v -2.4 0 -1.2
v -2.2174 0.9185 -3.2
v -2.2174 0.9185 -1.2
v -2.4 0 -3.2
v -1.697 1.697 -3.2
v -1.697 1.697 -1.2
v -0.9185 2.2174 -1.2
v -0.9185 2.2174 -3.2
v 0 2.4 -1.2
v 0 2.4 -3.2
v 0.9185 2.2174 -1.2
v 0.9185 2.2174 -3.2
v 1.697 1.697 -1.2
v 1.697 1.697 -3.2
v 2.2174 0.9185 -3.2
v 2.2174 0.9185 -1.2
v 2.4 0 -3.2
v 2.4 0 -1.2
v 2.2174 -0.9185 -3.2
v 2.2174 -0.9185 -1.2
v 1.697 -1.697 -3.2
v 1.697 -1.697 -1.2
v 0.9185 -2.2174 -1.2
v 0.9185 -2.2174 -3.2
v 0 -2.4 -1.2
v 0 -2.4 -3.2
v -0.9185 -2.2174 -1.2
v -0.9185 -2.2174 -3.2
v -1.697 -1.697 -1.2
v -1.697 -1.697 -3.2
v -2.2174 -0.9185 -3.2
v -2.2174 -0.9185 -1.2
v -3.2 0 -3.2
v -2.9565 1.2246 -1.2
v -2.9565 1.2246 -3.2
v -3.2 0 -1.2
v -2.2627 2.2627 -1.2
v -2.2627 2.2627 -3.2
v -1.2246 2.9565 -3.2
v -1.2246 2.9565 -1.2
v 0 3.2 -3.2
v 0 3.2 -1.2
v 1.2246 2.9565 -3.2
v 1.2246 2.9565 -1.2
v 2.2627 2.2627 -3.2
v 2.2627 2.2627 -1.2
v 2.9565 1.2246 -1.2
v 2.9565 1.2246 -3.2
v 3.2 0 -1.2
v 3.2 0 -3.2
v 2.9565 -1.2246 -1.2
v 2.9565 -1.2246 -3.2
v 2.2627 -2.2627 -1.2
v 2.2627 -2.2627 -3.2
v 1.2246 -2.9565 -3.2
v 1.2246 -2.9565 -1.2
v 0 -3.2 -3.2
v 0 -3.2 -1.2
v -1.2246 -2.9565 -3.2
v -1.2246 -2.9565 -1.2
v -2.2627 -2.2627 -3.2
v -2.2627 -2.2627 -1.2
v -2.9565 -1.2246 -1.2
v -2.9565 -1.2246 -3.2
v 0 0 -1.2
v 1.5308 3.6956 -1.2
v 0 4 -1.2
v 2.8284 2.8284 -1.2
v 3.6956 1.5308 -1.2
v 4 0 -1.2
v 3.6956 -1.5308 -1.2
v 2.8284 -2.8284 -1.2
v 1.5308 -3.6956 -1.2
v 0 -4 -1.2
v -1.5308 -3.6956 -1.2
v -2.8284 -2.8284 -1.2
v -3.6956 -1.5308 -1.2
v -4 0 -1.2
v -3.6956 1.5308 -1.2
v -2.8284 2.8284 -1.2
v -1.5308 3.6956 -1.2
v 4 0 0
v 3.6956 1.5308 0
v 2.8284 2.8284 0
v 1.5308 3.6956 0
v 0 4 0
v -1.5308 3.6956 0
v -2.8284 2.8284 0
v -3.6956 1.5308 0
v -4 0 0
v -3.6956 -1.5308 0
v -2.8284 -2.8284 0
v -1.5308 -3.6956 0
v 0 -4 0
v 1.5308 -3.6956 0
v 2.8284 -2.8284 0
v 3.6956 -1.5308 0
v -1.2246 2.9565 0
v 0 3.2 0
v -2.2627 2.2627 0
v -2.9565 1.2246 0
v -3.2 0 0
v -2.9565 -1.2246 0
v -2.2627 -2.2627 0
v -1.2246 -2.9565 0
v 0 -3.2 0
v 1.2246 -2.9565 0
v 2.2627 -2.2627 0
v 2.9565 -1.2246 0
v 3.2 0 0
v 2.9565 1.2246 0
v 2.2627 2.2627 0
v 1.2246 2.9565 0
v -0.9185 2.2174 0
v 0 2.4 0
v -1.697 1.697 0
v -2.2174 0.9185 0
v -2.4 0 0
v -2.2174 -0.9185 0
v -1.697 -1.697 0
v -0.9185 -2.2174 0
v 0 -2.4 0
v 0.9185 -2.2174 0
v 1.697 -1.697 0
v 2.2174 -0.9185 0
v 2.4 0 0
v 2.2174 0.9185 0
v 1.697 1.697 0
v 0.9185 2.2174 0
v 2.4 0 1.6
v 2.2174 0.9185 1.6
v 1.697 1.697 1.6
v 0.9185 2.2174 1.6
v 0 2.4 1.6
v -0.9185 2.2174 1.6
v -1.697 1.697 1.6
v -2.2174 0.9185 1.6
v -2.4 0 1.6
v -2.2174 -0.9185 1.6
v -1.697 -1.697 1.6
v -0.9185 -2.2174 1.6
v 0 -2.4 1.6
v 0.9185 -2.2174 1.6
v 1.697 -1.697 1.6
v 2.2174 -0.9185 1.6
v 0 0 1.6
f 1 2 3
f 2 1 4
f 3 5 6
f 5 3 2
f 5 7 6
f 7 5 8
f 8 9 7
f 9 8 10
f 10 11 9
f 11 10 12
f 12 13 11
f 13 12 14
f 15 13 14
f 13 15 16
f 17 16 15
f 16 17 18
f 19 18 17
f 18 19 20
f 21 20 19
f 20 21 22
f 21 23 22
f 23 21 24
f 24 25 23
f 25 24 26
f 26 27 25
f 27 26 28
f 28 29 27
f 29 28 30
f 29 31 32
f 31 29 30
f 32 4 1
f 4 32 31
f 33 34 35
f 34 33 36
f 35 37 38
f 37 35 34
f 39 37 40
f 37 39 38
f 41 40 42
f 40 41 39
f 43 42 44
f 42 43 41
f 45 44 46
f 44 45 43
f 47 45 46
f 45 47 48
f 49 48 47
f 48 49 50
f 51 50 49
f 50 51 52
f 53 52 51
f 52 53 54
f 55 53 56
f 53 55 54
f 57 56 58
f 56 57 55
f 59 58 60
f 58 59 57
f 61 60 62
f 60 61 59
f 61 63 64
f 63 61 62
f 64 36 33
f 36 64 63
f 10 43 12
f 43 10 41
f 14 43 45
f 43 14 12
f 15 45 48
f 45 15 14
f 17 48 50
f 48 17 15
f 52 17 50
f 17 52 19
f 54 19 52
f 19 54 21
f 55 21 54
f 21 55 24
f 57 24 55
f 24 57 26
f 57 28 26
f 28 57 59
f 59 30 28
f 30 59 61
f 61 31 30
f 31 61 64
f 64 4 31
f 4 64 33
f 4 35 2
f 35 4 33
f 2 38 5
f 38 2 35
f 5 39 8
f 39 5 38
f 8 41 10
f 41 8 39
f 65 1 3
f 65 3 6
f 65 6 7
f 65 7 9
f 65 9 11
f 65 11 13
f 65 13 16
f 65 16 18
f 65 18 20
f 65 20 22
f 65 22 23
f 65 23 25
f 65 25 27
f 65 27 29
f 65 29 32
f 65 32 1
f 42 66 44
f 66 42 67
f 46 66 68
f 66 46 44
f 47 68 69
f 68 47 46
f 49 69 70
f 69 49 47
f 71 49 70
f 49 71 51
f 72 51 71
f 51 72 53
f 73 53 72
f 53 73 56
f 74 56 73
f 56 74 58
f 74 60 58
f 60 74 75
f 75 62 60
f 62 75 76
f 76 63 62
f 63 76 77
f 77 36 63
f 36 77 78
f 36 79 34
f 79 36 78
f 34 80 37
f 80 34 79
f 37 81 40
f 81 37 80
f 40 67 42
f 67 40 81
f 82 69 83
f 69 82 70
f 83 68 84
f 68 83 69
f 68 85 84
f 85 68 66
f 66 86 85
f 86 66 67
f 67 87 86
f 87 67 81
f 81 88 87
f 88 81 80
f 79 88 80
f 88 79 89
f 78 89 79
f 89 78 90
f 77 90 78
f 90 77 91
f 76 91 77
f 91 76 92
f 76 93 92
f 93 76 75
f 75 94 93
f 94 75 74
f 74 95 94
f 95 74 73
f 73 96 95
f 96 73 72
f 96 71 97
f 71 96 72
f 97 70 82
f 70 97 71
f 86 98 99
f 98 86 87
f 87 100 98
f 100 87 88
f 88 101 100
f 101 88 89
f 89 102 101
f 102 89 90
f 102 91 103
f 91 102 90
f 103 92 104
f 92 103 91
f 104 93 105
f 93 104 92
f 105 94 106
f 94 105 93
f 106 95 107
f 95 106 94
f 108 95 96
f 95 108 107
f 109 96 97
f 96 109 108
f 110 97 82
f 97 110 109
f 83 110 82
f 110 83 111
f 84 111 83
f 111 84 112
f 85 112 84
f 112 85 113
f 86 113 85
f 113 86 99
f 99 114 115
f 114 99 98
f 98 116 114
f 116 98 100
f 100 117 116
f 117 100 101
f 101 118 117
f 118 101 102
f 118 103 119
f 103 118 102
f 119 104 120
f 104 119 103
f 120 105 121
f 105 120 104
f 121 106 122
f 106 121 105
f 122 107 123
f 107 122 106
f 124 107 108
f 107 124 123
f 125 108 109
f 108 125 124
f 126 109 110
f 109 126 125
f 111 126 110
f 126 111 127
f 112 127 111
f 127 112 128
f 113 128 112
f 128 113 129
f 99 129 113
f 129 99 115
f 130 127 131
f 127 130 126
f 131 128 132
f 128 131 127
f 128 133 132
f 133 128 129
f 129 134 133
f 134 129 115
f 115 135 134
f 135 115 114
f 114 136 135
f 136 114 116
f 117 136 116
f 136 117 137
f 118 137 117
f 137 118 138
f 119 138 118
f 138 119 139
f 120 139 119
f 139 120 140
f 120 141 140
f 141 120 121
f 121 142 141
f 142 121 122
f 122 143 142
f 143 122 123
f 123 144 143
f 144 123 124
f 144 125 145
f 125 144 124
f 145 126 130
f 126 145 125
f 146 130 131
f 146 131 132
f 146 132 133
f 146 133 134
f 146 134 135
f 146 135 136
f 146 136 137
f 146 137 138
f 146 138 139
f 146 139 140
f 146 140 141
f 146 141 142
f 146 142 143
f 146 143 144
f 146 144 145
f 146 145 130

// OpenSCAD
// file: ../p/4-4edge.scad
use <../lib.scad>
function ldraw_lib__4_4edge() = [
// 0 Circle 1.0
// 0 Name: 4-4edge.dat
// 0 Author: James Jessiman
// 0 !LDRAW_ORG Primitive UPDATE 2017-01
// 0 !LICENSE Licensed under CC BY 2.0 and CC BY 4.0 : see CAreadme.txt
// 
// 0 BFC CERTIFY CCW
  [0,"BFC","CERTIFY"],
  [0,"BFC","CCW"],
// 
// 0 !HISTORY 1998-12-15 [PTadmin] Official Update 1998-10
// 0 !HISTORY 2005-12-28 [PTadmin] Official Update 2005-01
// 0 !HISTORY 2007-06-24 [PTadmin] Header formatted for Contributor Agreement
// 0 !HISTORY 2008-07-01 [PTadmin] Official Update 2008-01
// 0 !HISTORY 2017-01-15 [Steffen] BFCed
// 0 !HISTORY 2017-12-30 [PTadmin] Official Update 2017-01
// 
// 
// 2 24 1 0 0 0.9239 0 0.3827
  [2,24,1,0,0,0.9239,0,0.3827],
// 2 24 0.9239 0 0.3827 0.7071 0 0.7071
  [2,24,0.9239,0,0.3827,0.7071,0,0.7071],
// 2 24 0.7071 0 0.7071 0.3827 0 0.9239
  [2,24,0.7071,0,0.7071,0.3827,0,0.9239],
// 2 24 0.3827 0 0.9239 0 0 1
  [2,24,0.3827,0,0.9239,0,0,1],
// 2 24 0 0 1 -0.3827 0 0.9239
  [2,24,0,0,1,-0.3827,0,0.9239],
// 2 24 -0.3827 0 0.9239 -0.7071 0 0.7071
  [2,24,-0.3827,0,0.9239,-0.7071,0,0.7071],
// 2 24 -0.7071 0 0.7071 -0.9239 0 0.3827
  [2,24,-0.7071,0,0.7071,-0.9239,0,0.3827],
// 2 24 -0.9239 0 0.3827 -1 0 -0
  [2,24,-0.9239,0,0.3827,-1,0,-0],
// 2 24 -1 0 -0 -0.9239 0 -0.3827
  [2,24,-1,0,-0,-0.9239,0,-0.3827],
// 2 24 -0.9239 0 -0.3827 -0.7071 0 -0.7071
  [2,24,-0.9239,0,-0.3827,-0.7071,0,-0.7071],
// 2 24 -0.7071 0 -0.7071 -0.3827 0 -0.9239
  [2,24,-0.7071,0,-0.7071,-0.3827,0,-0.9239],
// 2 24 -0.3827 0 -0.9239 0 0 -1
  [2,24,-0.3827,0,-0.9239,0,0,-1],
// 2 24 0 0 -1 0.3827 0 -0.9239
  [2,24,0,0,-1,0.3827,0,-0.9239],
// 2 24 0.3827 0 -0.9239 0.7071 0 -0.7071
  [2,24,0.3827,0,-0.9239,0.7071,0,-0.7071],
// 2 24 0.7071 0 -0.7071 0.9239 0 -0.3827
  [2,24,0.7071,0,-0.7071,0.9239,0,-0.3827],
// 2 24 0.9239 0 -0.3827 1 0 0
  [2,24,0.9239,0,-0.3827,1,0,0],
];
makepoly(ldraw_lib__4_4edge(), line=0.2);
// file: ../p/4-4cyli.scad
use <../lib.scad>
function ldraw_lib__4_4cyli() = [
// 0 Cylinder 1.0
// 0 Name: 4-4cyli.dat
// 0 Author: James Jessiman
// 0 !LDRAW_ORG Primitive UPDATE 2005-01
// 0 !LICENSE Licensed under CC BY 2.0 and CC BY 4.0 : see CAreadme.txt
// 
// 0 BFC CERTIFY CCW
  [0,"BFC","CERTIFY"],
  [0,"BFC","CCW"],
// 
// 0 !HISTORY 1998-12-15 [PTadmin] Official Update 1998-10
// 0 !HISTORY 2002-03-23 [sbliss] Added BFC statement; merged headers from files in distributions LDraw 0.27 and Complete.
// 0 !HISTORY 2002-04-25 [PTadmin] Official Update 2002-02
// 0 !HISTORY 2004-12-14 [guyvivan] BFC CCW
// 0 !HISTORY 2005-12-28 [PTadmin] Official Update 2005-01
// 0 !HISTORY 2007-06-24 [PTadmin] Header formatted for Contributor Agreement
// 0 !HISTORY 2008-07-01 [PTadmin] Official Update 2008-01
// 
// 
// 4 16 1 1 0 0.9239 1 0.3827 0.9239 0 0.3827 1 0 0
  [4,16,1,1,0,0.9239,1,0.3827,0.9239,0,0.3827,1,0,0],
// 5 24 1 0 0 1 1 0 0.9239 0 0.3827 0.9239 0 -0.3827
  [5,24,1,0,0,1,1,0,0.9239,0,0.3827,0.9239,0,-0.3827],
// 4 16 0.9239 1 0.3827 0.7071 1 0.7071 0.7071 0 0.7071 0.9239 0 0.3827
  [4,16,0.9239,1,0.3827,0.7071,1,0.7071,0.7071,0,0.7071,0.9239,0,0.3827],
// 5 24 0.9239 0 0.3827 0.9239 1 0.3827 0.7071 0 0.7071 1 0 0
  [5,24,0.9239,0,0.3827,0.9239,1,0.3827,0.7071,0,0.7071,1,0,0],
// 4 16 0.7071 1 0.7071 0.3827 1 0.9239 0.3827 0 0.9239 0.7071 0 0.7071
  [4,16,0.7071,1,0.7071,0.3827,1,0.9239,0.3827,0,0.9239,0.7071,0,0.7071],
// 5 24 0.7071 0 0.7071 0.7071 1 0.7071 0.3827 0 0.9239 0.9239 0 0.3827
  [5,24,0.7071,0,0.7071,0.7071,1,0.7071,0.3827,0,0.9239,0.9239,0,0.3827],
// 4 16 0.3827 1 0.9239 0 1 1 0 0 1 0.3827 0 0.9239
  [4,16,0.3827,1,0.9239,0,1,1,0,0,1,0.3827,0,0.9239],
// 5 24 0.3827 0 0.9239 0.3827 1 0.9239 0 0 1 0.7071 0 0.7071
  [5,24,0.3827,0,0.9239,0.3827,1,0.9239,0,0,1,0.7071,0,0.7071],
// 4 16 0 1 1 -0.3827 1 0.9239 -0.3827 0 0.9239 0 0 1
  [4,16,0,1,1,-0.3827,1,0.9239,-0.3827,0,0.9239,0,0,1],
// 5 24 0 0 1 0 1 1 -0.3827 0 0.9239 0.3827 0 0.9239
  [5,24,0,0,1,0,1,1,-0.3827,0,0.9239,0.3827,0,0.9239],
// 4 16 -0.3827 1 0.9239 -0.7071 1 0.7071 -0.7071 0 0.7071 -0.3827 0 0.9239
  [4,16,-0.3827,1,0.9239,-0.7071,1,0.7071,-0.7071,0,0.7071,-0.3827,0,0.9239],
// 5 24 -0.3827 0 0.9239 -0.3827 1 0.9239 -0.7071 0 0.7071 0 0 1
  [5,24,-0.3827,0,0.9239,-0.3827,1,0.9239,-0.7071,0,0.7071,0,0,1],
// 4 16 -0.7071 1 0.7071 -0.9239 1 0.3827 -0.9239 0 0.3827 -0.7071 0 0.7071
  [4,16,-0.7071,1,0.7071,-0.9239,1,0.3827,-0.9239,0,0.3827,-0.7071,0,0.7071],
// 5 24 -0.7071 0 0.7071 -0.7071 1 0.7071 -0.9239 0 0.3827 -0.3827 0 0.9239
  [5,24,-0.7071,0,0.7071,-0.7071,1,0.7071,-0.9239,0,0.3827,-0.3827,0,0.9239],
// 4 16 -0.9239 1 0.3827 -1 1 0 -1 0 0 -0.9239 0 0.3827
  [4,16,-0.9239,1,0.3827,-1,1,0,-1,0,0,-0.9239,0,0.3827],
// 5 24 -0.9239 0 0.3827 -0.9239 1 0.3827 -1 0 0 -0.7071 0 0.7071
  [5,24,-0.9239,0,0.3827,-0.9239,1,0.3827,-1,0,0,-0.7071,0,0.7071],
// 4 16 -1 1 0 -0.9239 1 -0.3827 -0.9239 0 -0.3827 -1 0 0
  [4,16,-1,1,0,-0.9239,1,-0.3827,-0.9239,0,-0.3827,-1,0,0],
// 5 24 -1 0 0 -1 1 0 -0.9239 0 -0.3827 -0.9239 0 0.3827
  [5,24,-1,0,0,-1,1,0,-0.9239,0,-0.3827,-0.9239,0,0.3827],
// 4 16 -0.9239 1 -0.3827 -0.7071 1 -0.7071 -0.7071 0 -0.7071 -0.9239 0 -0.3827
  [4,16,-0.9239,1,-0.3827,-0.7071,1,-0.7071,-0.7071,0,-0.7071,-0.9239,0,-0.3827],
// 5 24 -0.9239 0 -0.3827 -0.9239 1 -0.3827 -0.7071 0 -0.7071 -1 0 0
  [5,24,-0.9239,0,-0.3827,-0.9239,1,-0.3827,-0.7071,0,-0.7071,-1,0,0],
// 4 16 -0.7071 1 -0.7071 -0.3827 1 -0.9239 -0.3827 0 -0.9239 -0.7071 0 -0.7071
  [4,16,-0.7071,1,-0.7071,-0.3827,1,-0.9239,-0.3827,0,-0.9239,-0.7071,0,-0.7071],
// 5 24 -0.7071 0 -0.7071 -0.7071 1 -0.7071 -0.3827 0 -0.9239 -0.9239 0 -0.3827
  [5,24,-0.7071,0,-0.7071,-0.7071,1,-0.7071,-0.3827,0,-0.9239,-0.9239,0,-0.3827],
// 4 16 -0.3827 1 -0.9239 0 1 -1 0 0 -1 -0.3827 0 -0.9239
  [4,16,-0.3827,1,-0.9239,0,1,-1,0,0,-1,-0.3827,0,-0.9239],
// 5 24 -0.3827 0 -0.9239 -0.3827 1 -0.9239 0 0 -1 -0.7071 0 -0.7071
  [5,24,-0.3827,0,-0.9239,-0.3827,1,-0.9239,0,0,-1,-0.7071,0,-0.7071],
// 4 16 0 1 -1 0.3827 1 -0.9239 0.3827 0 -0.9239 0 0 -1
  [4,16,0,1,-1,0.3827,1,-0.9239,0.3827,0,-0.9239,0,0,-1],
// 5 24 0 0 -1 0 1 -1 0.3827 0 -0.9239 -0.3827 0 -0.9239
  [5,24,0,0,-1,0,1,-1,0.3827,0,-0.9239,-0.3827,0,-0.9239],
// 4 16 0.3827 1 -0.9239 0.7071 1 -0.7071 0.7071 0 -0.7071 0.3827 0 -0.9239
  [4,16,0.3827,1,-0.9239,0.7071,1,-0.7071,0.7071,0,-0.7071,0.3827,0,-0.9239],
// 5 24 0.3827 0 -0.9239 0.3827 1 -0.9239 0.7071 0 -0.7071 0 0 -1
  [5,24,0.3827,0,-0.9239,0.3827,1,-0.9239,0.7071,0,-0.7071,0,0,-1],
// 4 16 0.7071 1 -0.7071 0.9239 1 -0.3827 0.9239 0 -0.3827 0.7071 0 -0.7071
  [4,16,0.7071,1,-0.7071,0.9239,1,-0.3827,0.9239,0,-0.3827,0.7071,0,-0.7071],
// 5 24 0.7071 0 -0.7071 0.7071 1 -0.7071 0.9239 0 -0.3827 0.3827 0 -0.9239
  [5,24,0.7071,0,-0.7071,0.7071,1,-0.7071,0.9239,0,-0.3827,0.3827,0,-0.9239],
// 4 16 0.9239 1 -0.3827 1 1 0 1 0 0 0.9239 0 -0.3827
  [4,16,0.9239,1,-0.3827,1,1,0,1,0,0,0.9239,0,-0.3827],
// 5 24 0.9239 0 -0.3827 0.9239 1 -0.3827 1 0 0 0.7071 0 -0.7071
  [5,24,0.9239,0,-0.3827,0.9239,1,-0.3827,1,0,0,0.7071,0,-0.7071],
// 0
];
makepoly(ldraw_lib__4_4cyli(), line=0.2);
// file: ../p/stud4.scad
use <../lib.scad>
use <4-4cyli.scad>
use <4-4edge.scad>
use <4-4ring3.scad>
function ldraw_lib__stud4() = [
// 0 Stud Tube Open
// 0 Name: stud4.dat
// 0 Author: James Jessiman
// 0 !LDRAW_ORG Primitive UPDATE 2009-02
// 0 !LICENSE Licensed under CC BY 2.0 and CC BY 4.0 : see CAreadme.txt
// 
// 0 BFC CERTIFY CCW
  [0,"BFC","CERTIFY"],
  [0,"BFC","CCW"],
// 
// 0 !HISTORY 1999-07-05 [PTadmin] Official Update 1999-05
// 0 !HISTORY 2002-04-04 [sbliss] Modified for BFC compliance
// 0 !HISTORY 2002-04-25 [PTadmin] Official Update 2002-02
// 0 !HISTORY 2007-06-24 [PTadmin] Header formatted for Contributor Agreement
// 0 !HISTORY 2008-07-01 [PTadmin] Official Update 2008-01
// 0 !HISTORY 2009-06-21 [cwdee] Update ring references to 4-4ring
// 0 !HISTORY 2009-09-03 [PTadmin] Official Update 2009-02
// 
// 
// 1 16 0 -4 0 6 0 0 0 1 0 0 0 6 4-4edge.dat
  [1,16,0,-4,0,6,0,0,0,1,0,0,0,6, ldraw_lib__4_4edge()],
// 1 16 0 -4 0 8 0 0 0 1 0 0 0 8 4-4edge.dat
  [1,16,0,-4,0,8,0,0,0,1,0,0,0,8, ldraw_lib__4_4edge()],
// 1 16 0 0 0 6 0 0 0 1 0 0 0 6 4-4edge.dat
  [1,16,0,0,0,6,0,0,0,1,0,0,0,6, ldraw_lib__4_4edge()],
// 1 16 0 0 0 8 0 0 0 1 0 0 0 8 4-4edge.dat
  [1,16,0,0,0,8,0,0,0,1,0,0,0,8, ldraw_lib__4_4edge()],
// 0 BFC INVERTNEXT
  [0,"BFC","INVERTNEXT"],
// 1 16 0 -4 0 6 0 0 0 4 0 0 0 6 4-4cyli.dat
  [1,16,0,-4,0,6,0,0,0,4,0,0,0,6, ldraw_lib__4_4cyli()],
// 1 16 0 -4 0 8 0 0 0 4 0 0 0 8 4-4cyli.dat
  [1,16,0,-4,0,8,0,0,0,4,0,0,0,8, ldraw_lib__4_4cyli()],
// 1 16 0 -4 0 2 0 0 0 1 0 0 0 2 4-4ring3.dat
  [1,16,0,-4,0,2,0,0,0,1,0,0,0,2, ldraw_lib__4_4ring3()],
// 0
];
makepoly(ldraw_lib__stud4(), line=0.2);
// file: ../p/stud.scad
use <../lib.scad>
use <4-4cyli.scad>
use <4-4disc.scad>
use <4-4edge.scad>
function ldraw_lib__stud() = [
// 0 Stud
// 0 Name: stud.dat
// 0 Author: James Jessiman
// 0 !LDRAW_ORG Primitive UPDATE 2012-01
// 0 !LICENSE Licensed under CC BY 2.0 and CC BY 4.0 : see CAreadme.txt
// 
// 0 BFC CERTIFY CCW
  [0,"BFC","CERTIFY"],
  [0,"BFC","CCW"],
// 
// 0 !HISTORY 2002-04-04 [sbliss] Modified for BFC compliance
// 0 !HISTORY 2002-04-25 [PTadmin] Official Update 2002-02
// 0 !HISTORY 2007-06-24 [PTadmin] Header formatted for Contributor Agreement
// 0 !HISTORY 2008-07-01 [PTadmin] Official Update 2008-01
// 0 !HISTORY 2012-02-16 [Philo] Changed to CCW
// 0 !HISTORY 2012-03-30 [PTadmin] Official Update 2012-01
// 
// 
// 1 16 0 0 0 6 0 0 0 1 0 0 0 6 4-4edge.dat
  [1,16,0,0,0,6,0,0,0,1,0,0,0,6, ldraw_lib__4_4edge()],
// 1 16 0 -4 0 6 0 0 0 1 0 0 0 6 4-4edge.dat
  [1,16,0,-4,0,6,0,0,0,1,0,0,0,6, ldraw_lib__4_4edge()],
// 1 16 0 0 0 6 0 0 0 -4 0 0 0 6 4-4cyli.dat
  [1,16,0,0,0,6,0,0,0,-4,0,0,0,6, ldraw_lib__4_4cyli()],
// 1 16 0 -4 0 6 0 0 0 1 0 0 0 6 4-4disc.dat
  [1,16,0,-4,0,6,0,0,0,1,0,0,0,6, ldraw_lib__4_4disc()],
];
makepoly(ldraw_lib__stud(), line=0.2);
// file: ../p/4-4ring4.scad
use <../lib.scad>
function ldraw_lib__4_4ring4() = [
// 0 Ring  4 x 1.0
// 0 Name: 4-4ring4.dat
// 0 Author: James Jessiman
// 0 !LDRAW_ORG Primitive UPDATE 2009-01
// 0 !LICENSE Licensed under CC BY 2.0 and CC BY 4.0 : see CAreadme.txt
// 
// 0 BFC CERTIFY CCW
  [0,"BFC","CERTIFY"],
  [0,"BFC","CCW"],
// 
// 0 !HISTORY 1998-12-15 [PTadmin] Official Update 1998-10
// 0 !HISTORY 2002-04-08 [BrickCaster] Modified for BFC compliance
// 0 !HISTORY 2002-04-25 [PTadmin] Official Update 2002-02
// 0 !HISTORY 2007-06-24 [PTadmin] Header formatted for Contributor Agreement
// 0 !HISTORY 2008-07-01 [PTadmin] Official Update 2008-01
// 0 !HISTORY 2008-08-26 [cwdee] Switch polygon winding and rename
// 0 !HISTORY 2009-05-02 [PTadmin] Official Update 2009-01
// 
// 
// 4 16 -1.9135 0 4.6195 -1.5308 0 3.6956 0 0 4 0 0 5
  [4,16,-1.9135,0,4.6195,-1.5308,0,3.6956,0,0,4,0,0,5],
// 4 16 -3.5355 0 3.5355 -2.8284 0 2.8284 -1.5308 0 3.6956 -1.9135 0 4.6195
  [4,16,-3.5355,0,3.5355,-2.8284,0,2.8284,-1.5308,0,3.6956,-1.9135,0,4.6195],
// 4 16 -4.6195 0 1.9135 -3.6956 0 1.5308 -2.8284 0 2.8284 -3.5355 0 3.5355
  [4,16,-4.6195,0,1.9135,-3.6956,0,1.5308,-2.8284,0,2.8284,-3.5355,0,3.5355],
// 4 16 -5 0 0 -4 0 0 -3.6956 0 1.5308 -4.6195 0 1.9135
  [4,16,-5,0,0,-4,0,0,-3.6956,0,1.5308,-4.6195,0,1.9135],
// 4 16 -4.6195 0 -1.9135 -3.6956 0 -1.5308 -4 0 0 -5 0 0
  [4,16,-4.6195,0,-1.9135,-3.6956,0,-1.5308,-4,0,0,-5,0,0],
// 4 16 -3.5355 0 -3.5355 -2.8284 0 -2.8284 -3.6956 0 -1.5308 -4.6195 0 -1.9135
  [4,16,-3.5355,0,-3.5355,-2.8284,0,-2.8284,-3.6956,0,-1.5308,-4.6195,0,-1.9135],
// 4 16 -1.9135 0 -4.6195 -1.5308 0 -3.6956 -2.8284 0 -2.8284 -3.5355 0 -3.5355
  [4,16,-1.9135,0,-4.6195,-1.5308,0,-3.6956,-2.8284,0,-2.8284,-3.5355,0,-3.5355],
// 4 16 0 0 -5 0 0 -4 -1.5308 0 -3.6956 -1.9135 0 -4.6195
  [4,16,0,0,-5,0,0,-4,-1.5308,0,-3.6956,-1.9135,0,-4.6195],
// 4 16 1.9135 0 -4.6195 1.5308 0 -3.6956 0 0 -4 0 0 -5
  [4,16,1.9135,0,-4.6195,1.5308,0,-3.6956,0,0,-4,0,0,-5],
// 4 16 3.5355 0 -3.5355 2.8284 0 -2.8284 1.5308 0 -3.6956 1.9135 0 -4.6195
  [4,16,3.5355,0,-3.5355,2.8284,0,-2.8284,1.5308,0,-3.6956,1.9135,0,-4.6195],
// 4 16 4.6195 0 -1.9135 3.6956 0 -1.5308 2.8284 0 -2.8284 3.5355 0 -3.5355
  [4,16,4.6195,0,-1.9135,3.6956,0,-1.5308,2.8284,0,-2.8284,3.5355,0,-3.5355],
// 4 16 5 0 0 4 0 0 3.6956 0 -1.5308 4.6195 0 -1.9135
  [4,16,5,0,0,4,0,0,3.6956,0,-1.5308,4.6195,0,-1.9135],
// 4 16 4.6195 0 1.9135 3.6956 0 1.5308 4 0 0 5 0 0
  [4,16,4.6195,0,1.9135,3.6956,0,1.5308,4,0,0,5,0,0],
// 4 16 3.5355 0 3.5355 2.8284 0 2.8284 3.6956 0 1.5308 4.6195 0 1.9135
  [4,16,3.5355,0,3.5355,2.8284,0,2.8284,3.6956,0,1.5308,4.6195,0,1.9135],
// 4 16 1.9135 0 4.6195 1.5308 0 3.6956 2.8284 0 2.8284 3.5355 0 3.5355
  [4,16,1.9135,0,4.6195,1.5308,0,3.6956,2.8284,0,2.8284,3.5355,0,3.5355],
// 4 16 0 0 5 0 0 4 1.5308 0 3.6956 1.9135 0 4.6195
  [4,16,0,0,5,0,0,4,1.5308,0,3.6956,1.9135,0,4.6195],
// 0
];
makepoly(ldraw_lib__4_4ring4(), line=0.2);
// file: ../p/4-4ring3.scad
use <../lib.scad>
function ldraw_lib__4_4ring3() = [
// 0 Ring  3 x 1.0
// 0 Name: 4-4ring3.dat
// 0 Author: James Jessiman
// 0 !LDRAW_ORG Primitive UPDATE 2009-01
// 0 !LICENSE Licensed under CC BY 2.0 and CC BY 4.0 : see CAreadme.txt
// 
// 0 BFC CERTIFY CCW
  [0,"BFC","CERTIFY"],
  [0,"BFC","CCW"],
// 
// 0 !HISTORY 1998-12-15 [PTadmin] Official Update 1998-10
// 0 !HISTORY 2002-04-05 [hafhead] Added BFC statement
// 0 !HISTORY 2002-04-25 [PTadmin] Official Update 2002-02
// 0 !HISTORY 2007-06-24 [PTadmin] Header formatted for Contributor Agreement
// 0 !HISTORY 2008-07-01 [PTadmin] Official Update 2008-01
// 0 !HISTORY 2008-08-26 [cwdee] Switch polygon winding and rename
// 0 !HISTORY 2009-05-02 [PTadmin] Official Update 2009-01
// 
// 
// 4 16 -1.5308 0 3.6956 -1.1481 0 2.7717 0 0 3 0 0 4
  [4,16,-1.5308,0,3.6956,-1.1481,0,2.7717,0,0,3,0,0,4],
// 4 16 -2.8284 0 2.8284 -2.1213 0 2.1213 -1.1481 0 2.7717 -1.5308 0 3.6956
  [4,16,-2.8284,0,2.8284,-2.1213,0,2.1213,-1.1481,0,2.7717,-1.5308,0,3.6956],
// 4 16 -3.6956 0 1.5308 -2.7717 0 1.1481 -2.1213 0 2.1213 -2.8284 0 2.8284
  [4,16,-3.6956,0,1.5308,-2.7717,0,1.1481,-2.1213,0,2.1213,-2.8284,0,2.8284],
// 4 16 -4 0 0 -3 0 0 -2.7717 0 1.1481 -3.6956 0 1.5308
  [4,16,-4,0,0,-3,0,0,-2.7717,0,1.1481,-3.6956,0,1.5308],
// 4 16 -3.6956 0 -1.5308 -2.7717 0 -1.1481 -3 0 0 -4 0 0
  [4,16,-3.6956,0,-1.5308,-2.7717,0,-1.1481,-3,0,0,-4,0,0],
// 4 16 -2.8284 0 -2.8284 -2.1213 0 -2.1213 -2.7717 0 -1.1481 -3.6956 0 -1.5308
  [4,16,-2.8284,0,-2.8284,-2.1213,0,-2.1213,-2.7717,0,-1.1481,-3.6956,0,-1.5308],
// 4 16 -1.5308 0 -3.6956 -1.1481 0 -2.7717 -2.1213 0 -2.1213 -2.8284 0 -2.8284
  [4,16,-1.5308,0,-3.6956,-1.1481,0,-2.7717,-2.1213,0,-2.1213,-2.8284,0,-2.8284],
// 4 16 0 0 -4 0 0 -3 -1.1481 0 -2.7717 -1.5308 0 -3.6956
  [4,16,0,0,-4,0,0,-3,-1.1481,0,-2.7717,-1.5308,0,-3.6956],
// 4 16 1.5308 0 -3.6956 1.1481 0 -2.7717 0 0 -3 0 0 -4
  [4,16,1.5308,0,-3.6956,1.1481,0,-2.7717,0,0,-3,0,0,-4],
// 4 16 2.8284 0 -2.8284 2.1213 0 -2.1213 1.1481 0 -2.7717 1.5308 0 -3.6956
  [4,16,2.8284,0,-2.8284,2.1213,0,-2.1213,1.1481,0,-2.7717,1.5308,0,-3.6956],
// 4 16 3.6956 0 -1.5308 2.7717 0 -1.1481 2.1213 0 -2.1213 2.8284 0 -2.8284
  [4,16,3.6956,0,-1.5308,2.7717,0,-1.1481,2.1213,0,-2.1213,2.8284,0,-2.8284],
// 4 16 4 0 0 3 0 0 2.7717 0 -1.1481 3.6956 0 -1.5308
  [4,16,4,0,0,3,0,0,2.7717,0,-1.1481,3.6956,0,-1.5308],
// 4 16 3.6956 0 1.5308 2.7717 0 1.1481 3 0 0 4 0 0
  [4,16,3.6956,0,1.5308,2.7717,0,1.1481,3,0,0,4,0,0],
// 4 16 2.8284 0 2.8284 2.1213 0 2.1213 2.7717 0 1.1481 3.6956 0 1.5308
  [4,16,2.8284,0,2.8284,2.1213,0,2.1213,2.7717,0,1.1481,3.6956,0,1.5308],
// 4 16 1.5308 0 3.6956 1.1481 0 2.7717 2.1213 0 2.1213 2.8284 0 2.8284
  [4,16,1.5308,0,3.6956,1.1481,0,2.7717,2.1213,0,2.1213,2.8284,0,2.8284],
// 4 16 0 0 4 0 0 3 1.1481 0 2.7717 1.5308 0 3.6956
  [4,16,0,0,4,0,0,3,1.1481,0,2.7717,1.5308,0,3.6956],
// 0
];
makepoly(ldraw_lib__4_4ring3(), line=0.2);
// file: ../p/4-4disc.scad
use <../lib.scad>
function ldraw_lib__4_4disc() = [
// 0 Disc 1.0
// 0 Name: 4-4disc.dat
// 0 Author: James Jessiman
// 0 !LDRAW_ORG Primitive UPDATE 2002-02
// 0 !LICENSE Licensed under CC BY 2.0 and CC BY 4.0 : see CAreadme.txt
// 
// 0 BFC CERTIFY CCW
  [0,"BFC","CERTIFY"],
  [0,"BFC","CCW"],
// 
// 0 !HISTORY 1998-12-15 [PTadmin] Official Update 1998-10
// 0 !HISTORY 2002-03-23 [sbliss] Added BFC statement
// 0 !HISTORY 2002-04-25 [PTadmin] Official Update 2002-02
// 0 !HISTORY 2007-06-24 [PTadmin] Header formatted for Contributor Agreement
// 0 !HISTORY 2008-07-01 [PTadmin] Official Update 2008-01
// 
// 
// 3 16 0 0 0 1 0 0 0.9239 0 0.3827
  [3,16,0,0,0,1,0,0,0.9239,0,0.3827],
// 3 16 0 0 0 0.9239 0 0.3827 0.7071 0 0.7071
  [3,16,0,0,0,0.9239,0,0.3827,0.7071,0,0.7071],
// 3 16 0 0 0 0.7071 0 0.7071 0.3827 0 0.9239
  [3,16,0,0,0,0.7071,0,0.7071,0.3827,0,0.9239],
// 3 16 0 0 0 0.3827 0 0.9239 0 0 1
  [3,16,0,0,0,0.3827,0,0.9239,0,0,1],
// 3 16 0 0 0 0 0 1 -0.3827 0 0.9239
  [3,16,0,0,0,0,0,1,-0.3827,0,0.9239],
// 3 16 0 0 0 -0.3827 0 0.9239 -0.7071 0 0.7071
  [3,16,0,0,0,-0.3827,0,0.9239,-0.7071,0,0.7071],
// 3 16 0 0 0 -0.7071 0 0.7071 -0.9239 0 0.3827
  [3,16,0,0,0,-0.7071,0,0.7071,-0.9239,0,0.3827],
// 3 16 0 0 0 -0.9239 0 0.3827 -1 0 -0
  [3,16,0,0,0,-0.9239,0,0.3827,-1,0,-0],
// 3 16 0 0 0 -1 0 -0 -0.9239 0 -0.3827
  [3,16,0,0,0,-1,0,-0,-0.9239,0,-0.3827],
// 3 16 0 0 0 -0.9239 0 -0.3827 -0.7071 0 -0.7071
  [3,16,0,0,0,-0.9239,0,-0.3827,-0.7071,0,-0.7071],
// 3 16 0 0 0 -0.7071 0 -0.7071 -0.3827 0 -0.9239
  [3,16,0,0,0,-0.7071,0,-0.7071,-0.3827,0,-0.9239],
// 3 16 0 0 0 -0.3827 0 -0.9239 0 0 -1
  [3,16,0,0,0,-0.3827,0,-0.9239,0,0,-1],
// 3 16 0 0 0 0 0 -1 0.3827 0 -0.9239
  [3,16,0,0,0,0,0,-1,0.3827,0,-0.9239],
// 3 16 0 0 0 0.3827 0 -0.9239 0.7071 0 -0.7071
  [3,16,0,0,0,0.3827,0,-0.9239,0.7071,0,-0.7071],
// 3 16 0 0 0 0.7071 0 -0.7071 0.9239 0 -0.3827
  [3,16,0,0,0,0.7071,0,-0.7071,0.9239,0,-0.3827],
// 3 16 0 0 0 0.9239 0 -0.3827 1 0 0
  [3,16,0,0,0,0.9239,0,-0.3827,1,0,0],
// 0
];
makepoly(ldraw_lib__4_4disc(), line=0.2);
// file: ../p/4-4cylo.scad
use <../lib.scad>
use <4-4cyli.scad>
use <4-4edge.scad>
function ldraw_lib__4_4cylo() = [
// 0 Cylinder Open 1.0
// 0 Name: 4-4cylo.dat
// 0 Author: Mark Kennedy [mkennedy]
// 0 !LDRAW_ORG Primitive UPDATE 2010-01
// 0 !LICENSE Licensed under CC BY 2.0 and CC BY 4.0 : see CAreadme.txt
// 
// 0 BFC CERTIFY CCW
  [0,"BFC","CERTIFY"],
  [0,"BFC","CCW"],
// 
// 0 !HISTORY 2010-04-05 [PTadmin] Official Update 2010-01
// 
// 
// 1 16 0 0 0 1 0 0 0 1 0 0 0 1 4-4edge.dat
  [1,16,0,0,0,1,0,0,0,1,0,0,0,1, ldraw_lib__4_4edge()],
// 1 16 0 1 0 1 0 0 0 1 0 0 0 1 4-4edge.dat
  [1,16,0,1,0,1,0,0,0,1,0,0,0,1, ldraw_lib__4_4edge()],
// 1 16 0 0 0 1 0 0 0 1 0 0 0 1 4-4cyli.dat
  [1,16,0,0,0,1,0,0,0,1,0,0,0,1, ldraw_lib__4_4cyli()],
// 0
];
makepoly(ldraw_lib__4_4cylo(), line=0.2);
// file: 6141.scad
use <../lib.scad>
use <../p/4-4cylo.scad>
use <../p/4-4disc.scad>
use <../p/4-4ring3.scad>
use <../p/4-4ring4.scad>
use <../p/stud.scad>
use <../p/stud4.scad>
function ldraw_lib__6141() = [
// 0 Plate  1 x  1 Round
// 0 Name: 6141.dat
// 0 Author: James Jessiman
// 0 !LDRAW_ORG Part UPDATE 2015-01
// 0 !LICENSE Licensed under CC BY 2.0 and CC BY 4.0 : see CAreadme.txt
// 
// 0 BFC CERTIFY CCW
  [0,"BFC","CERTIFY"],
  [0,"BFC","CCW"],
// 
// 0 !HISTORY 1998-06-20 [PTadmin] Official Update 1998-06
// 0 !HISTORY 2003-01-29 [sbliss] Completed header; BFC'ed; misc cleanup
// 0 !HISTORY 2003-08-01 [PTadmin] Official Update 2003-02
// 0 !HISTORY 2007-10-26 [PTadmin] Header formatted for Contributor Agreement
// 0 !HISTORY 2008-07-01 [PTadmin] Official Update 2008-01
// 0 !HISTORY 2014-11-29 [Steffen] Renamed from 4073
// 0 !HISTORY 2014-12-28 [MagFors] Primitive substitution
// 0 !HISTORY 2015-10-11 [PTadmin] Official Update 2015-01
// 
// 
// 1 16 0 3 0 -1 0 0 0 -1.25 0 0 0 1 stud4.dat
  [1,16,0,3,0,-1,0,0,0,-1.25,0,0,0,1, ldraw_lib__stud4()],
// 1 16 0 3 0 -6 0 0 0 -1 0 0 0 6 4-4disc.dat
  [1,16,0,3,0,-6,0,0,0,-1,0,0,0,6, ldraw_lib__4_4disc()],
// 1 16 0 3 0 -2 0 0 0 -1 0 0 0 2 4-4ring4.dat
  [1,16,0,3,0,-2,0,0,0,-1,0,0,0,2, ldraw_lib__4_4ring4()],
// 1 16 0 0 0 10 0 0 0 3 0 0 0 10 4-4cylo.dat
  [1,16,0,0,0,10,0,0,0,3,0,0,0,10, ldraw_lib__4_4cylo()],
// 1 16 0 0 0 2 0 0 0 1 0 0 0 2 4-4ring4.dat
  [1,16,0,0,0,2,0,0,0,1,0,0,0,2, ldraw_lib__4_4ring4()],
// 1 16 0 0 0 2 0 0 0 1 0 0 0 2 4-4ring3.dat
  [1,16,0,0,0,2,0,0,0,1,0,0,0,2, ldraw_lib__4_4ring3()],
// 1 16 0 0 0 1 0 0 0 1 0 0 0 1 stud.dat
  [1,16,0,0,0,1,0,0,0,1,0,0,0,1, ldraw_lib__stud()],
];
makepoly(ldraw_lib__6141(), line=0.2);
// file: 4073.scad
use <../lib.scad>
use <6141.scad>
function ldraw_lib__4073() = [
// 0 ~Moved to 6141
// 0 Name: 4073.dat
// 0 Author: [PTadmin]
// 0 !LDRAW_ORG Part Alias UPDATE 2015-01
// 0 !LICENSE Licensed under CC BY 4.0 : see CAreadme.txt
// 
// 0 BFC CERTIFY CCW
  [0,"BFC","CERTIFY"],
  [0,"BFC","CCW"],
// 
// 0 !HISTORY 2015-10-11 [PTadmin] Official Update 2015-01
// 
// 
// 0 // Plate 1 x 1 Round
// 
// 1 16 0 0 0 1 0 0 0 1 0 0 0 1 6141.dat
  [1,16,0,0,0,1,0,0,0,1,0,0,0,1, ldraw_lib__6141()],
];
makepoly(ldraw_lib__4073(), line=0.2);
// main file
use <../lib.scad>
use <4073.scad>
function ldraw_lib__3005741() = [
// 0 ~_Plate  1 x  1 Round Trans Red (Obsolete)
// 0 Name: 3005741.dat
// 0 Author: Michael Heidemann [mikeheide]
// 0 !LDRAW_ORG Part Physical_Colour UPDATE 2019-02
// 0 !LICENSE Licensed under CC BY 2.0 and CC BY 4.0 : see CAreadme.txt
// 
// 0 BFC CERTIFY CCW
  [0,"BFC","CERTIFY"],
  [0,"BFC","CCW"],
// 
// 0 !HISTORY 2010-12-31 [PTadmin] Official Update 2010-03
// 0 !HISTORY 2019-07-19 [Holly-Wood] Obsoleted per decision not to include physical colour parts
// 0 !HISTORY 2019-09-09 [PTadmin] Official Update 2019-02
// 
// 
// 0 // This file is a "shortcut" with the correct number for the actual
// 0 // colouring of the part (Trans Red).
// 
// 1 36 0 0 0 1 0 0 0 1 0 0 0 1 4073.dat
  [1,36,0,0,0,1,0,0,0,1,0,0,0,1, ldraw_lib__4073()],
];
makepoly(ldraw_lib__3005741(), line=0.2);
